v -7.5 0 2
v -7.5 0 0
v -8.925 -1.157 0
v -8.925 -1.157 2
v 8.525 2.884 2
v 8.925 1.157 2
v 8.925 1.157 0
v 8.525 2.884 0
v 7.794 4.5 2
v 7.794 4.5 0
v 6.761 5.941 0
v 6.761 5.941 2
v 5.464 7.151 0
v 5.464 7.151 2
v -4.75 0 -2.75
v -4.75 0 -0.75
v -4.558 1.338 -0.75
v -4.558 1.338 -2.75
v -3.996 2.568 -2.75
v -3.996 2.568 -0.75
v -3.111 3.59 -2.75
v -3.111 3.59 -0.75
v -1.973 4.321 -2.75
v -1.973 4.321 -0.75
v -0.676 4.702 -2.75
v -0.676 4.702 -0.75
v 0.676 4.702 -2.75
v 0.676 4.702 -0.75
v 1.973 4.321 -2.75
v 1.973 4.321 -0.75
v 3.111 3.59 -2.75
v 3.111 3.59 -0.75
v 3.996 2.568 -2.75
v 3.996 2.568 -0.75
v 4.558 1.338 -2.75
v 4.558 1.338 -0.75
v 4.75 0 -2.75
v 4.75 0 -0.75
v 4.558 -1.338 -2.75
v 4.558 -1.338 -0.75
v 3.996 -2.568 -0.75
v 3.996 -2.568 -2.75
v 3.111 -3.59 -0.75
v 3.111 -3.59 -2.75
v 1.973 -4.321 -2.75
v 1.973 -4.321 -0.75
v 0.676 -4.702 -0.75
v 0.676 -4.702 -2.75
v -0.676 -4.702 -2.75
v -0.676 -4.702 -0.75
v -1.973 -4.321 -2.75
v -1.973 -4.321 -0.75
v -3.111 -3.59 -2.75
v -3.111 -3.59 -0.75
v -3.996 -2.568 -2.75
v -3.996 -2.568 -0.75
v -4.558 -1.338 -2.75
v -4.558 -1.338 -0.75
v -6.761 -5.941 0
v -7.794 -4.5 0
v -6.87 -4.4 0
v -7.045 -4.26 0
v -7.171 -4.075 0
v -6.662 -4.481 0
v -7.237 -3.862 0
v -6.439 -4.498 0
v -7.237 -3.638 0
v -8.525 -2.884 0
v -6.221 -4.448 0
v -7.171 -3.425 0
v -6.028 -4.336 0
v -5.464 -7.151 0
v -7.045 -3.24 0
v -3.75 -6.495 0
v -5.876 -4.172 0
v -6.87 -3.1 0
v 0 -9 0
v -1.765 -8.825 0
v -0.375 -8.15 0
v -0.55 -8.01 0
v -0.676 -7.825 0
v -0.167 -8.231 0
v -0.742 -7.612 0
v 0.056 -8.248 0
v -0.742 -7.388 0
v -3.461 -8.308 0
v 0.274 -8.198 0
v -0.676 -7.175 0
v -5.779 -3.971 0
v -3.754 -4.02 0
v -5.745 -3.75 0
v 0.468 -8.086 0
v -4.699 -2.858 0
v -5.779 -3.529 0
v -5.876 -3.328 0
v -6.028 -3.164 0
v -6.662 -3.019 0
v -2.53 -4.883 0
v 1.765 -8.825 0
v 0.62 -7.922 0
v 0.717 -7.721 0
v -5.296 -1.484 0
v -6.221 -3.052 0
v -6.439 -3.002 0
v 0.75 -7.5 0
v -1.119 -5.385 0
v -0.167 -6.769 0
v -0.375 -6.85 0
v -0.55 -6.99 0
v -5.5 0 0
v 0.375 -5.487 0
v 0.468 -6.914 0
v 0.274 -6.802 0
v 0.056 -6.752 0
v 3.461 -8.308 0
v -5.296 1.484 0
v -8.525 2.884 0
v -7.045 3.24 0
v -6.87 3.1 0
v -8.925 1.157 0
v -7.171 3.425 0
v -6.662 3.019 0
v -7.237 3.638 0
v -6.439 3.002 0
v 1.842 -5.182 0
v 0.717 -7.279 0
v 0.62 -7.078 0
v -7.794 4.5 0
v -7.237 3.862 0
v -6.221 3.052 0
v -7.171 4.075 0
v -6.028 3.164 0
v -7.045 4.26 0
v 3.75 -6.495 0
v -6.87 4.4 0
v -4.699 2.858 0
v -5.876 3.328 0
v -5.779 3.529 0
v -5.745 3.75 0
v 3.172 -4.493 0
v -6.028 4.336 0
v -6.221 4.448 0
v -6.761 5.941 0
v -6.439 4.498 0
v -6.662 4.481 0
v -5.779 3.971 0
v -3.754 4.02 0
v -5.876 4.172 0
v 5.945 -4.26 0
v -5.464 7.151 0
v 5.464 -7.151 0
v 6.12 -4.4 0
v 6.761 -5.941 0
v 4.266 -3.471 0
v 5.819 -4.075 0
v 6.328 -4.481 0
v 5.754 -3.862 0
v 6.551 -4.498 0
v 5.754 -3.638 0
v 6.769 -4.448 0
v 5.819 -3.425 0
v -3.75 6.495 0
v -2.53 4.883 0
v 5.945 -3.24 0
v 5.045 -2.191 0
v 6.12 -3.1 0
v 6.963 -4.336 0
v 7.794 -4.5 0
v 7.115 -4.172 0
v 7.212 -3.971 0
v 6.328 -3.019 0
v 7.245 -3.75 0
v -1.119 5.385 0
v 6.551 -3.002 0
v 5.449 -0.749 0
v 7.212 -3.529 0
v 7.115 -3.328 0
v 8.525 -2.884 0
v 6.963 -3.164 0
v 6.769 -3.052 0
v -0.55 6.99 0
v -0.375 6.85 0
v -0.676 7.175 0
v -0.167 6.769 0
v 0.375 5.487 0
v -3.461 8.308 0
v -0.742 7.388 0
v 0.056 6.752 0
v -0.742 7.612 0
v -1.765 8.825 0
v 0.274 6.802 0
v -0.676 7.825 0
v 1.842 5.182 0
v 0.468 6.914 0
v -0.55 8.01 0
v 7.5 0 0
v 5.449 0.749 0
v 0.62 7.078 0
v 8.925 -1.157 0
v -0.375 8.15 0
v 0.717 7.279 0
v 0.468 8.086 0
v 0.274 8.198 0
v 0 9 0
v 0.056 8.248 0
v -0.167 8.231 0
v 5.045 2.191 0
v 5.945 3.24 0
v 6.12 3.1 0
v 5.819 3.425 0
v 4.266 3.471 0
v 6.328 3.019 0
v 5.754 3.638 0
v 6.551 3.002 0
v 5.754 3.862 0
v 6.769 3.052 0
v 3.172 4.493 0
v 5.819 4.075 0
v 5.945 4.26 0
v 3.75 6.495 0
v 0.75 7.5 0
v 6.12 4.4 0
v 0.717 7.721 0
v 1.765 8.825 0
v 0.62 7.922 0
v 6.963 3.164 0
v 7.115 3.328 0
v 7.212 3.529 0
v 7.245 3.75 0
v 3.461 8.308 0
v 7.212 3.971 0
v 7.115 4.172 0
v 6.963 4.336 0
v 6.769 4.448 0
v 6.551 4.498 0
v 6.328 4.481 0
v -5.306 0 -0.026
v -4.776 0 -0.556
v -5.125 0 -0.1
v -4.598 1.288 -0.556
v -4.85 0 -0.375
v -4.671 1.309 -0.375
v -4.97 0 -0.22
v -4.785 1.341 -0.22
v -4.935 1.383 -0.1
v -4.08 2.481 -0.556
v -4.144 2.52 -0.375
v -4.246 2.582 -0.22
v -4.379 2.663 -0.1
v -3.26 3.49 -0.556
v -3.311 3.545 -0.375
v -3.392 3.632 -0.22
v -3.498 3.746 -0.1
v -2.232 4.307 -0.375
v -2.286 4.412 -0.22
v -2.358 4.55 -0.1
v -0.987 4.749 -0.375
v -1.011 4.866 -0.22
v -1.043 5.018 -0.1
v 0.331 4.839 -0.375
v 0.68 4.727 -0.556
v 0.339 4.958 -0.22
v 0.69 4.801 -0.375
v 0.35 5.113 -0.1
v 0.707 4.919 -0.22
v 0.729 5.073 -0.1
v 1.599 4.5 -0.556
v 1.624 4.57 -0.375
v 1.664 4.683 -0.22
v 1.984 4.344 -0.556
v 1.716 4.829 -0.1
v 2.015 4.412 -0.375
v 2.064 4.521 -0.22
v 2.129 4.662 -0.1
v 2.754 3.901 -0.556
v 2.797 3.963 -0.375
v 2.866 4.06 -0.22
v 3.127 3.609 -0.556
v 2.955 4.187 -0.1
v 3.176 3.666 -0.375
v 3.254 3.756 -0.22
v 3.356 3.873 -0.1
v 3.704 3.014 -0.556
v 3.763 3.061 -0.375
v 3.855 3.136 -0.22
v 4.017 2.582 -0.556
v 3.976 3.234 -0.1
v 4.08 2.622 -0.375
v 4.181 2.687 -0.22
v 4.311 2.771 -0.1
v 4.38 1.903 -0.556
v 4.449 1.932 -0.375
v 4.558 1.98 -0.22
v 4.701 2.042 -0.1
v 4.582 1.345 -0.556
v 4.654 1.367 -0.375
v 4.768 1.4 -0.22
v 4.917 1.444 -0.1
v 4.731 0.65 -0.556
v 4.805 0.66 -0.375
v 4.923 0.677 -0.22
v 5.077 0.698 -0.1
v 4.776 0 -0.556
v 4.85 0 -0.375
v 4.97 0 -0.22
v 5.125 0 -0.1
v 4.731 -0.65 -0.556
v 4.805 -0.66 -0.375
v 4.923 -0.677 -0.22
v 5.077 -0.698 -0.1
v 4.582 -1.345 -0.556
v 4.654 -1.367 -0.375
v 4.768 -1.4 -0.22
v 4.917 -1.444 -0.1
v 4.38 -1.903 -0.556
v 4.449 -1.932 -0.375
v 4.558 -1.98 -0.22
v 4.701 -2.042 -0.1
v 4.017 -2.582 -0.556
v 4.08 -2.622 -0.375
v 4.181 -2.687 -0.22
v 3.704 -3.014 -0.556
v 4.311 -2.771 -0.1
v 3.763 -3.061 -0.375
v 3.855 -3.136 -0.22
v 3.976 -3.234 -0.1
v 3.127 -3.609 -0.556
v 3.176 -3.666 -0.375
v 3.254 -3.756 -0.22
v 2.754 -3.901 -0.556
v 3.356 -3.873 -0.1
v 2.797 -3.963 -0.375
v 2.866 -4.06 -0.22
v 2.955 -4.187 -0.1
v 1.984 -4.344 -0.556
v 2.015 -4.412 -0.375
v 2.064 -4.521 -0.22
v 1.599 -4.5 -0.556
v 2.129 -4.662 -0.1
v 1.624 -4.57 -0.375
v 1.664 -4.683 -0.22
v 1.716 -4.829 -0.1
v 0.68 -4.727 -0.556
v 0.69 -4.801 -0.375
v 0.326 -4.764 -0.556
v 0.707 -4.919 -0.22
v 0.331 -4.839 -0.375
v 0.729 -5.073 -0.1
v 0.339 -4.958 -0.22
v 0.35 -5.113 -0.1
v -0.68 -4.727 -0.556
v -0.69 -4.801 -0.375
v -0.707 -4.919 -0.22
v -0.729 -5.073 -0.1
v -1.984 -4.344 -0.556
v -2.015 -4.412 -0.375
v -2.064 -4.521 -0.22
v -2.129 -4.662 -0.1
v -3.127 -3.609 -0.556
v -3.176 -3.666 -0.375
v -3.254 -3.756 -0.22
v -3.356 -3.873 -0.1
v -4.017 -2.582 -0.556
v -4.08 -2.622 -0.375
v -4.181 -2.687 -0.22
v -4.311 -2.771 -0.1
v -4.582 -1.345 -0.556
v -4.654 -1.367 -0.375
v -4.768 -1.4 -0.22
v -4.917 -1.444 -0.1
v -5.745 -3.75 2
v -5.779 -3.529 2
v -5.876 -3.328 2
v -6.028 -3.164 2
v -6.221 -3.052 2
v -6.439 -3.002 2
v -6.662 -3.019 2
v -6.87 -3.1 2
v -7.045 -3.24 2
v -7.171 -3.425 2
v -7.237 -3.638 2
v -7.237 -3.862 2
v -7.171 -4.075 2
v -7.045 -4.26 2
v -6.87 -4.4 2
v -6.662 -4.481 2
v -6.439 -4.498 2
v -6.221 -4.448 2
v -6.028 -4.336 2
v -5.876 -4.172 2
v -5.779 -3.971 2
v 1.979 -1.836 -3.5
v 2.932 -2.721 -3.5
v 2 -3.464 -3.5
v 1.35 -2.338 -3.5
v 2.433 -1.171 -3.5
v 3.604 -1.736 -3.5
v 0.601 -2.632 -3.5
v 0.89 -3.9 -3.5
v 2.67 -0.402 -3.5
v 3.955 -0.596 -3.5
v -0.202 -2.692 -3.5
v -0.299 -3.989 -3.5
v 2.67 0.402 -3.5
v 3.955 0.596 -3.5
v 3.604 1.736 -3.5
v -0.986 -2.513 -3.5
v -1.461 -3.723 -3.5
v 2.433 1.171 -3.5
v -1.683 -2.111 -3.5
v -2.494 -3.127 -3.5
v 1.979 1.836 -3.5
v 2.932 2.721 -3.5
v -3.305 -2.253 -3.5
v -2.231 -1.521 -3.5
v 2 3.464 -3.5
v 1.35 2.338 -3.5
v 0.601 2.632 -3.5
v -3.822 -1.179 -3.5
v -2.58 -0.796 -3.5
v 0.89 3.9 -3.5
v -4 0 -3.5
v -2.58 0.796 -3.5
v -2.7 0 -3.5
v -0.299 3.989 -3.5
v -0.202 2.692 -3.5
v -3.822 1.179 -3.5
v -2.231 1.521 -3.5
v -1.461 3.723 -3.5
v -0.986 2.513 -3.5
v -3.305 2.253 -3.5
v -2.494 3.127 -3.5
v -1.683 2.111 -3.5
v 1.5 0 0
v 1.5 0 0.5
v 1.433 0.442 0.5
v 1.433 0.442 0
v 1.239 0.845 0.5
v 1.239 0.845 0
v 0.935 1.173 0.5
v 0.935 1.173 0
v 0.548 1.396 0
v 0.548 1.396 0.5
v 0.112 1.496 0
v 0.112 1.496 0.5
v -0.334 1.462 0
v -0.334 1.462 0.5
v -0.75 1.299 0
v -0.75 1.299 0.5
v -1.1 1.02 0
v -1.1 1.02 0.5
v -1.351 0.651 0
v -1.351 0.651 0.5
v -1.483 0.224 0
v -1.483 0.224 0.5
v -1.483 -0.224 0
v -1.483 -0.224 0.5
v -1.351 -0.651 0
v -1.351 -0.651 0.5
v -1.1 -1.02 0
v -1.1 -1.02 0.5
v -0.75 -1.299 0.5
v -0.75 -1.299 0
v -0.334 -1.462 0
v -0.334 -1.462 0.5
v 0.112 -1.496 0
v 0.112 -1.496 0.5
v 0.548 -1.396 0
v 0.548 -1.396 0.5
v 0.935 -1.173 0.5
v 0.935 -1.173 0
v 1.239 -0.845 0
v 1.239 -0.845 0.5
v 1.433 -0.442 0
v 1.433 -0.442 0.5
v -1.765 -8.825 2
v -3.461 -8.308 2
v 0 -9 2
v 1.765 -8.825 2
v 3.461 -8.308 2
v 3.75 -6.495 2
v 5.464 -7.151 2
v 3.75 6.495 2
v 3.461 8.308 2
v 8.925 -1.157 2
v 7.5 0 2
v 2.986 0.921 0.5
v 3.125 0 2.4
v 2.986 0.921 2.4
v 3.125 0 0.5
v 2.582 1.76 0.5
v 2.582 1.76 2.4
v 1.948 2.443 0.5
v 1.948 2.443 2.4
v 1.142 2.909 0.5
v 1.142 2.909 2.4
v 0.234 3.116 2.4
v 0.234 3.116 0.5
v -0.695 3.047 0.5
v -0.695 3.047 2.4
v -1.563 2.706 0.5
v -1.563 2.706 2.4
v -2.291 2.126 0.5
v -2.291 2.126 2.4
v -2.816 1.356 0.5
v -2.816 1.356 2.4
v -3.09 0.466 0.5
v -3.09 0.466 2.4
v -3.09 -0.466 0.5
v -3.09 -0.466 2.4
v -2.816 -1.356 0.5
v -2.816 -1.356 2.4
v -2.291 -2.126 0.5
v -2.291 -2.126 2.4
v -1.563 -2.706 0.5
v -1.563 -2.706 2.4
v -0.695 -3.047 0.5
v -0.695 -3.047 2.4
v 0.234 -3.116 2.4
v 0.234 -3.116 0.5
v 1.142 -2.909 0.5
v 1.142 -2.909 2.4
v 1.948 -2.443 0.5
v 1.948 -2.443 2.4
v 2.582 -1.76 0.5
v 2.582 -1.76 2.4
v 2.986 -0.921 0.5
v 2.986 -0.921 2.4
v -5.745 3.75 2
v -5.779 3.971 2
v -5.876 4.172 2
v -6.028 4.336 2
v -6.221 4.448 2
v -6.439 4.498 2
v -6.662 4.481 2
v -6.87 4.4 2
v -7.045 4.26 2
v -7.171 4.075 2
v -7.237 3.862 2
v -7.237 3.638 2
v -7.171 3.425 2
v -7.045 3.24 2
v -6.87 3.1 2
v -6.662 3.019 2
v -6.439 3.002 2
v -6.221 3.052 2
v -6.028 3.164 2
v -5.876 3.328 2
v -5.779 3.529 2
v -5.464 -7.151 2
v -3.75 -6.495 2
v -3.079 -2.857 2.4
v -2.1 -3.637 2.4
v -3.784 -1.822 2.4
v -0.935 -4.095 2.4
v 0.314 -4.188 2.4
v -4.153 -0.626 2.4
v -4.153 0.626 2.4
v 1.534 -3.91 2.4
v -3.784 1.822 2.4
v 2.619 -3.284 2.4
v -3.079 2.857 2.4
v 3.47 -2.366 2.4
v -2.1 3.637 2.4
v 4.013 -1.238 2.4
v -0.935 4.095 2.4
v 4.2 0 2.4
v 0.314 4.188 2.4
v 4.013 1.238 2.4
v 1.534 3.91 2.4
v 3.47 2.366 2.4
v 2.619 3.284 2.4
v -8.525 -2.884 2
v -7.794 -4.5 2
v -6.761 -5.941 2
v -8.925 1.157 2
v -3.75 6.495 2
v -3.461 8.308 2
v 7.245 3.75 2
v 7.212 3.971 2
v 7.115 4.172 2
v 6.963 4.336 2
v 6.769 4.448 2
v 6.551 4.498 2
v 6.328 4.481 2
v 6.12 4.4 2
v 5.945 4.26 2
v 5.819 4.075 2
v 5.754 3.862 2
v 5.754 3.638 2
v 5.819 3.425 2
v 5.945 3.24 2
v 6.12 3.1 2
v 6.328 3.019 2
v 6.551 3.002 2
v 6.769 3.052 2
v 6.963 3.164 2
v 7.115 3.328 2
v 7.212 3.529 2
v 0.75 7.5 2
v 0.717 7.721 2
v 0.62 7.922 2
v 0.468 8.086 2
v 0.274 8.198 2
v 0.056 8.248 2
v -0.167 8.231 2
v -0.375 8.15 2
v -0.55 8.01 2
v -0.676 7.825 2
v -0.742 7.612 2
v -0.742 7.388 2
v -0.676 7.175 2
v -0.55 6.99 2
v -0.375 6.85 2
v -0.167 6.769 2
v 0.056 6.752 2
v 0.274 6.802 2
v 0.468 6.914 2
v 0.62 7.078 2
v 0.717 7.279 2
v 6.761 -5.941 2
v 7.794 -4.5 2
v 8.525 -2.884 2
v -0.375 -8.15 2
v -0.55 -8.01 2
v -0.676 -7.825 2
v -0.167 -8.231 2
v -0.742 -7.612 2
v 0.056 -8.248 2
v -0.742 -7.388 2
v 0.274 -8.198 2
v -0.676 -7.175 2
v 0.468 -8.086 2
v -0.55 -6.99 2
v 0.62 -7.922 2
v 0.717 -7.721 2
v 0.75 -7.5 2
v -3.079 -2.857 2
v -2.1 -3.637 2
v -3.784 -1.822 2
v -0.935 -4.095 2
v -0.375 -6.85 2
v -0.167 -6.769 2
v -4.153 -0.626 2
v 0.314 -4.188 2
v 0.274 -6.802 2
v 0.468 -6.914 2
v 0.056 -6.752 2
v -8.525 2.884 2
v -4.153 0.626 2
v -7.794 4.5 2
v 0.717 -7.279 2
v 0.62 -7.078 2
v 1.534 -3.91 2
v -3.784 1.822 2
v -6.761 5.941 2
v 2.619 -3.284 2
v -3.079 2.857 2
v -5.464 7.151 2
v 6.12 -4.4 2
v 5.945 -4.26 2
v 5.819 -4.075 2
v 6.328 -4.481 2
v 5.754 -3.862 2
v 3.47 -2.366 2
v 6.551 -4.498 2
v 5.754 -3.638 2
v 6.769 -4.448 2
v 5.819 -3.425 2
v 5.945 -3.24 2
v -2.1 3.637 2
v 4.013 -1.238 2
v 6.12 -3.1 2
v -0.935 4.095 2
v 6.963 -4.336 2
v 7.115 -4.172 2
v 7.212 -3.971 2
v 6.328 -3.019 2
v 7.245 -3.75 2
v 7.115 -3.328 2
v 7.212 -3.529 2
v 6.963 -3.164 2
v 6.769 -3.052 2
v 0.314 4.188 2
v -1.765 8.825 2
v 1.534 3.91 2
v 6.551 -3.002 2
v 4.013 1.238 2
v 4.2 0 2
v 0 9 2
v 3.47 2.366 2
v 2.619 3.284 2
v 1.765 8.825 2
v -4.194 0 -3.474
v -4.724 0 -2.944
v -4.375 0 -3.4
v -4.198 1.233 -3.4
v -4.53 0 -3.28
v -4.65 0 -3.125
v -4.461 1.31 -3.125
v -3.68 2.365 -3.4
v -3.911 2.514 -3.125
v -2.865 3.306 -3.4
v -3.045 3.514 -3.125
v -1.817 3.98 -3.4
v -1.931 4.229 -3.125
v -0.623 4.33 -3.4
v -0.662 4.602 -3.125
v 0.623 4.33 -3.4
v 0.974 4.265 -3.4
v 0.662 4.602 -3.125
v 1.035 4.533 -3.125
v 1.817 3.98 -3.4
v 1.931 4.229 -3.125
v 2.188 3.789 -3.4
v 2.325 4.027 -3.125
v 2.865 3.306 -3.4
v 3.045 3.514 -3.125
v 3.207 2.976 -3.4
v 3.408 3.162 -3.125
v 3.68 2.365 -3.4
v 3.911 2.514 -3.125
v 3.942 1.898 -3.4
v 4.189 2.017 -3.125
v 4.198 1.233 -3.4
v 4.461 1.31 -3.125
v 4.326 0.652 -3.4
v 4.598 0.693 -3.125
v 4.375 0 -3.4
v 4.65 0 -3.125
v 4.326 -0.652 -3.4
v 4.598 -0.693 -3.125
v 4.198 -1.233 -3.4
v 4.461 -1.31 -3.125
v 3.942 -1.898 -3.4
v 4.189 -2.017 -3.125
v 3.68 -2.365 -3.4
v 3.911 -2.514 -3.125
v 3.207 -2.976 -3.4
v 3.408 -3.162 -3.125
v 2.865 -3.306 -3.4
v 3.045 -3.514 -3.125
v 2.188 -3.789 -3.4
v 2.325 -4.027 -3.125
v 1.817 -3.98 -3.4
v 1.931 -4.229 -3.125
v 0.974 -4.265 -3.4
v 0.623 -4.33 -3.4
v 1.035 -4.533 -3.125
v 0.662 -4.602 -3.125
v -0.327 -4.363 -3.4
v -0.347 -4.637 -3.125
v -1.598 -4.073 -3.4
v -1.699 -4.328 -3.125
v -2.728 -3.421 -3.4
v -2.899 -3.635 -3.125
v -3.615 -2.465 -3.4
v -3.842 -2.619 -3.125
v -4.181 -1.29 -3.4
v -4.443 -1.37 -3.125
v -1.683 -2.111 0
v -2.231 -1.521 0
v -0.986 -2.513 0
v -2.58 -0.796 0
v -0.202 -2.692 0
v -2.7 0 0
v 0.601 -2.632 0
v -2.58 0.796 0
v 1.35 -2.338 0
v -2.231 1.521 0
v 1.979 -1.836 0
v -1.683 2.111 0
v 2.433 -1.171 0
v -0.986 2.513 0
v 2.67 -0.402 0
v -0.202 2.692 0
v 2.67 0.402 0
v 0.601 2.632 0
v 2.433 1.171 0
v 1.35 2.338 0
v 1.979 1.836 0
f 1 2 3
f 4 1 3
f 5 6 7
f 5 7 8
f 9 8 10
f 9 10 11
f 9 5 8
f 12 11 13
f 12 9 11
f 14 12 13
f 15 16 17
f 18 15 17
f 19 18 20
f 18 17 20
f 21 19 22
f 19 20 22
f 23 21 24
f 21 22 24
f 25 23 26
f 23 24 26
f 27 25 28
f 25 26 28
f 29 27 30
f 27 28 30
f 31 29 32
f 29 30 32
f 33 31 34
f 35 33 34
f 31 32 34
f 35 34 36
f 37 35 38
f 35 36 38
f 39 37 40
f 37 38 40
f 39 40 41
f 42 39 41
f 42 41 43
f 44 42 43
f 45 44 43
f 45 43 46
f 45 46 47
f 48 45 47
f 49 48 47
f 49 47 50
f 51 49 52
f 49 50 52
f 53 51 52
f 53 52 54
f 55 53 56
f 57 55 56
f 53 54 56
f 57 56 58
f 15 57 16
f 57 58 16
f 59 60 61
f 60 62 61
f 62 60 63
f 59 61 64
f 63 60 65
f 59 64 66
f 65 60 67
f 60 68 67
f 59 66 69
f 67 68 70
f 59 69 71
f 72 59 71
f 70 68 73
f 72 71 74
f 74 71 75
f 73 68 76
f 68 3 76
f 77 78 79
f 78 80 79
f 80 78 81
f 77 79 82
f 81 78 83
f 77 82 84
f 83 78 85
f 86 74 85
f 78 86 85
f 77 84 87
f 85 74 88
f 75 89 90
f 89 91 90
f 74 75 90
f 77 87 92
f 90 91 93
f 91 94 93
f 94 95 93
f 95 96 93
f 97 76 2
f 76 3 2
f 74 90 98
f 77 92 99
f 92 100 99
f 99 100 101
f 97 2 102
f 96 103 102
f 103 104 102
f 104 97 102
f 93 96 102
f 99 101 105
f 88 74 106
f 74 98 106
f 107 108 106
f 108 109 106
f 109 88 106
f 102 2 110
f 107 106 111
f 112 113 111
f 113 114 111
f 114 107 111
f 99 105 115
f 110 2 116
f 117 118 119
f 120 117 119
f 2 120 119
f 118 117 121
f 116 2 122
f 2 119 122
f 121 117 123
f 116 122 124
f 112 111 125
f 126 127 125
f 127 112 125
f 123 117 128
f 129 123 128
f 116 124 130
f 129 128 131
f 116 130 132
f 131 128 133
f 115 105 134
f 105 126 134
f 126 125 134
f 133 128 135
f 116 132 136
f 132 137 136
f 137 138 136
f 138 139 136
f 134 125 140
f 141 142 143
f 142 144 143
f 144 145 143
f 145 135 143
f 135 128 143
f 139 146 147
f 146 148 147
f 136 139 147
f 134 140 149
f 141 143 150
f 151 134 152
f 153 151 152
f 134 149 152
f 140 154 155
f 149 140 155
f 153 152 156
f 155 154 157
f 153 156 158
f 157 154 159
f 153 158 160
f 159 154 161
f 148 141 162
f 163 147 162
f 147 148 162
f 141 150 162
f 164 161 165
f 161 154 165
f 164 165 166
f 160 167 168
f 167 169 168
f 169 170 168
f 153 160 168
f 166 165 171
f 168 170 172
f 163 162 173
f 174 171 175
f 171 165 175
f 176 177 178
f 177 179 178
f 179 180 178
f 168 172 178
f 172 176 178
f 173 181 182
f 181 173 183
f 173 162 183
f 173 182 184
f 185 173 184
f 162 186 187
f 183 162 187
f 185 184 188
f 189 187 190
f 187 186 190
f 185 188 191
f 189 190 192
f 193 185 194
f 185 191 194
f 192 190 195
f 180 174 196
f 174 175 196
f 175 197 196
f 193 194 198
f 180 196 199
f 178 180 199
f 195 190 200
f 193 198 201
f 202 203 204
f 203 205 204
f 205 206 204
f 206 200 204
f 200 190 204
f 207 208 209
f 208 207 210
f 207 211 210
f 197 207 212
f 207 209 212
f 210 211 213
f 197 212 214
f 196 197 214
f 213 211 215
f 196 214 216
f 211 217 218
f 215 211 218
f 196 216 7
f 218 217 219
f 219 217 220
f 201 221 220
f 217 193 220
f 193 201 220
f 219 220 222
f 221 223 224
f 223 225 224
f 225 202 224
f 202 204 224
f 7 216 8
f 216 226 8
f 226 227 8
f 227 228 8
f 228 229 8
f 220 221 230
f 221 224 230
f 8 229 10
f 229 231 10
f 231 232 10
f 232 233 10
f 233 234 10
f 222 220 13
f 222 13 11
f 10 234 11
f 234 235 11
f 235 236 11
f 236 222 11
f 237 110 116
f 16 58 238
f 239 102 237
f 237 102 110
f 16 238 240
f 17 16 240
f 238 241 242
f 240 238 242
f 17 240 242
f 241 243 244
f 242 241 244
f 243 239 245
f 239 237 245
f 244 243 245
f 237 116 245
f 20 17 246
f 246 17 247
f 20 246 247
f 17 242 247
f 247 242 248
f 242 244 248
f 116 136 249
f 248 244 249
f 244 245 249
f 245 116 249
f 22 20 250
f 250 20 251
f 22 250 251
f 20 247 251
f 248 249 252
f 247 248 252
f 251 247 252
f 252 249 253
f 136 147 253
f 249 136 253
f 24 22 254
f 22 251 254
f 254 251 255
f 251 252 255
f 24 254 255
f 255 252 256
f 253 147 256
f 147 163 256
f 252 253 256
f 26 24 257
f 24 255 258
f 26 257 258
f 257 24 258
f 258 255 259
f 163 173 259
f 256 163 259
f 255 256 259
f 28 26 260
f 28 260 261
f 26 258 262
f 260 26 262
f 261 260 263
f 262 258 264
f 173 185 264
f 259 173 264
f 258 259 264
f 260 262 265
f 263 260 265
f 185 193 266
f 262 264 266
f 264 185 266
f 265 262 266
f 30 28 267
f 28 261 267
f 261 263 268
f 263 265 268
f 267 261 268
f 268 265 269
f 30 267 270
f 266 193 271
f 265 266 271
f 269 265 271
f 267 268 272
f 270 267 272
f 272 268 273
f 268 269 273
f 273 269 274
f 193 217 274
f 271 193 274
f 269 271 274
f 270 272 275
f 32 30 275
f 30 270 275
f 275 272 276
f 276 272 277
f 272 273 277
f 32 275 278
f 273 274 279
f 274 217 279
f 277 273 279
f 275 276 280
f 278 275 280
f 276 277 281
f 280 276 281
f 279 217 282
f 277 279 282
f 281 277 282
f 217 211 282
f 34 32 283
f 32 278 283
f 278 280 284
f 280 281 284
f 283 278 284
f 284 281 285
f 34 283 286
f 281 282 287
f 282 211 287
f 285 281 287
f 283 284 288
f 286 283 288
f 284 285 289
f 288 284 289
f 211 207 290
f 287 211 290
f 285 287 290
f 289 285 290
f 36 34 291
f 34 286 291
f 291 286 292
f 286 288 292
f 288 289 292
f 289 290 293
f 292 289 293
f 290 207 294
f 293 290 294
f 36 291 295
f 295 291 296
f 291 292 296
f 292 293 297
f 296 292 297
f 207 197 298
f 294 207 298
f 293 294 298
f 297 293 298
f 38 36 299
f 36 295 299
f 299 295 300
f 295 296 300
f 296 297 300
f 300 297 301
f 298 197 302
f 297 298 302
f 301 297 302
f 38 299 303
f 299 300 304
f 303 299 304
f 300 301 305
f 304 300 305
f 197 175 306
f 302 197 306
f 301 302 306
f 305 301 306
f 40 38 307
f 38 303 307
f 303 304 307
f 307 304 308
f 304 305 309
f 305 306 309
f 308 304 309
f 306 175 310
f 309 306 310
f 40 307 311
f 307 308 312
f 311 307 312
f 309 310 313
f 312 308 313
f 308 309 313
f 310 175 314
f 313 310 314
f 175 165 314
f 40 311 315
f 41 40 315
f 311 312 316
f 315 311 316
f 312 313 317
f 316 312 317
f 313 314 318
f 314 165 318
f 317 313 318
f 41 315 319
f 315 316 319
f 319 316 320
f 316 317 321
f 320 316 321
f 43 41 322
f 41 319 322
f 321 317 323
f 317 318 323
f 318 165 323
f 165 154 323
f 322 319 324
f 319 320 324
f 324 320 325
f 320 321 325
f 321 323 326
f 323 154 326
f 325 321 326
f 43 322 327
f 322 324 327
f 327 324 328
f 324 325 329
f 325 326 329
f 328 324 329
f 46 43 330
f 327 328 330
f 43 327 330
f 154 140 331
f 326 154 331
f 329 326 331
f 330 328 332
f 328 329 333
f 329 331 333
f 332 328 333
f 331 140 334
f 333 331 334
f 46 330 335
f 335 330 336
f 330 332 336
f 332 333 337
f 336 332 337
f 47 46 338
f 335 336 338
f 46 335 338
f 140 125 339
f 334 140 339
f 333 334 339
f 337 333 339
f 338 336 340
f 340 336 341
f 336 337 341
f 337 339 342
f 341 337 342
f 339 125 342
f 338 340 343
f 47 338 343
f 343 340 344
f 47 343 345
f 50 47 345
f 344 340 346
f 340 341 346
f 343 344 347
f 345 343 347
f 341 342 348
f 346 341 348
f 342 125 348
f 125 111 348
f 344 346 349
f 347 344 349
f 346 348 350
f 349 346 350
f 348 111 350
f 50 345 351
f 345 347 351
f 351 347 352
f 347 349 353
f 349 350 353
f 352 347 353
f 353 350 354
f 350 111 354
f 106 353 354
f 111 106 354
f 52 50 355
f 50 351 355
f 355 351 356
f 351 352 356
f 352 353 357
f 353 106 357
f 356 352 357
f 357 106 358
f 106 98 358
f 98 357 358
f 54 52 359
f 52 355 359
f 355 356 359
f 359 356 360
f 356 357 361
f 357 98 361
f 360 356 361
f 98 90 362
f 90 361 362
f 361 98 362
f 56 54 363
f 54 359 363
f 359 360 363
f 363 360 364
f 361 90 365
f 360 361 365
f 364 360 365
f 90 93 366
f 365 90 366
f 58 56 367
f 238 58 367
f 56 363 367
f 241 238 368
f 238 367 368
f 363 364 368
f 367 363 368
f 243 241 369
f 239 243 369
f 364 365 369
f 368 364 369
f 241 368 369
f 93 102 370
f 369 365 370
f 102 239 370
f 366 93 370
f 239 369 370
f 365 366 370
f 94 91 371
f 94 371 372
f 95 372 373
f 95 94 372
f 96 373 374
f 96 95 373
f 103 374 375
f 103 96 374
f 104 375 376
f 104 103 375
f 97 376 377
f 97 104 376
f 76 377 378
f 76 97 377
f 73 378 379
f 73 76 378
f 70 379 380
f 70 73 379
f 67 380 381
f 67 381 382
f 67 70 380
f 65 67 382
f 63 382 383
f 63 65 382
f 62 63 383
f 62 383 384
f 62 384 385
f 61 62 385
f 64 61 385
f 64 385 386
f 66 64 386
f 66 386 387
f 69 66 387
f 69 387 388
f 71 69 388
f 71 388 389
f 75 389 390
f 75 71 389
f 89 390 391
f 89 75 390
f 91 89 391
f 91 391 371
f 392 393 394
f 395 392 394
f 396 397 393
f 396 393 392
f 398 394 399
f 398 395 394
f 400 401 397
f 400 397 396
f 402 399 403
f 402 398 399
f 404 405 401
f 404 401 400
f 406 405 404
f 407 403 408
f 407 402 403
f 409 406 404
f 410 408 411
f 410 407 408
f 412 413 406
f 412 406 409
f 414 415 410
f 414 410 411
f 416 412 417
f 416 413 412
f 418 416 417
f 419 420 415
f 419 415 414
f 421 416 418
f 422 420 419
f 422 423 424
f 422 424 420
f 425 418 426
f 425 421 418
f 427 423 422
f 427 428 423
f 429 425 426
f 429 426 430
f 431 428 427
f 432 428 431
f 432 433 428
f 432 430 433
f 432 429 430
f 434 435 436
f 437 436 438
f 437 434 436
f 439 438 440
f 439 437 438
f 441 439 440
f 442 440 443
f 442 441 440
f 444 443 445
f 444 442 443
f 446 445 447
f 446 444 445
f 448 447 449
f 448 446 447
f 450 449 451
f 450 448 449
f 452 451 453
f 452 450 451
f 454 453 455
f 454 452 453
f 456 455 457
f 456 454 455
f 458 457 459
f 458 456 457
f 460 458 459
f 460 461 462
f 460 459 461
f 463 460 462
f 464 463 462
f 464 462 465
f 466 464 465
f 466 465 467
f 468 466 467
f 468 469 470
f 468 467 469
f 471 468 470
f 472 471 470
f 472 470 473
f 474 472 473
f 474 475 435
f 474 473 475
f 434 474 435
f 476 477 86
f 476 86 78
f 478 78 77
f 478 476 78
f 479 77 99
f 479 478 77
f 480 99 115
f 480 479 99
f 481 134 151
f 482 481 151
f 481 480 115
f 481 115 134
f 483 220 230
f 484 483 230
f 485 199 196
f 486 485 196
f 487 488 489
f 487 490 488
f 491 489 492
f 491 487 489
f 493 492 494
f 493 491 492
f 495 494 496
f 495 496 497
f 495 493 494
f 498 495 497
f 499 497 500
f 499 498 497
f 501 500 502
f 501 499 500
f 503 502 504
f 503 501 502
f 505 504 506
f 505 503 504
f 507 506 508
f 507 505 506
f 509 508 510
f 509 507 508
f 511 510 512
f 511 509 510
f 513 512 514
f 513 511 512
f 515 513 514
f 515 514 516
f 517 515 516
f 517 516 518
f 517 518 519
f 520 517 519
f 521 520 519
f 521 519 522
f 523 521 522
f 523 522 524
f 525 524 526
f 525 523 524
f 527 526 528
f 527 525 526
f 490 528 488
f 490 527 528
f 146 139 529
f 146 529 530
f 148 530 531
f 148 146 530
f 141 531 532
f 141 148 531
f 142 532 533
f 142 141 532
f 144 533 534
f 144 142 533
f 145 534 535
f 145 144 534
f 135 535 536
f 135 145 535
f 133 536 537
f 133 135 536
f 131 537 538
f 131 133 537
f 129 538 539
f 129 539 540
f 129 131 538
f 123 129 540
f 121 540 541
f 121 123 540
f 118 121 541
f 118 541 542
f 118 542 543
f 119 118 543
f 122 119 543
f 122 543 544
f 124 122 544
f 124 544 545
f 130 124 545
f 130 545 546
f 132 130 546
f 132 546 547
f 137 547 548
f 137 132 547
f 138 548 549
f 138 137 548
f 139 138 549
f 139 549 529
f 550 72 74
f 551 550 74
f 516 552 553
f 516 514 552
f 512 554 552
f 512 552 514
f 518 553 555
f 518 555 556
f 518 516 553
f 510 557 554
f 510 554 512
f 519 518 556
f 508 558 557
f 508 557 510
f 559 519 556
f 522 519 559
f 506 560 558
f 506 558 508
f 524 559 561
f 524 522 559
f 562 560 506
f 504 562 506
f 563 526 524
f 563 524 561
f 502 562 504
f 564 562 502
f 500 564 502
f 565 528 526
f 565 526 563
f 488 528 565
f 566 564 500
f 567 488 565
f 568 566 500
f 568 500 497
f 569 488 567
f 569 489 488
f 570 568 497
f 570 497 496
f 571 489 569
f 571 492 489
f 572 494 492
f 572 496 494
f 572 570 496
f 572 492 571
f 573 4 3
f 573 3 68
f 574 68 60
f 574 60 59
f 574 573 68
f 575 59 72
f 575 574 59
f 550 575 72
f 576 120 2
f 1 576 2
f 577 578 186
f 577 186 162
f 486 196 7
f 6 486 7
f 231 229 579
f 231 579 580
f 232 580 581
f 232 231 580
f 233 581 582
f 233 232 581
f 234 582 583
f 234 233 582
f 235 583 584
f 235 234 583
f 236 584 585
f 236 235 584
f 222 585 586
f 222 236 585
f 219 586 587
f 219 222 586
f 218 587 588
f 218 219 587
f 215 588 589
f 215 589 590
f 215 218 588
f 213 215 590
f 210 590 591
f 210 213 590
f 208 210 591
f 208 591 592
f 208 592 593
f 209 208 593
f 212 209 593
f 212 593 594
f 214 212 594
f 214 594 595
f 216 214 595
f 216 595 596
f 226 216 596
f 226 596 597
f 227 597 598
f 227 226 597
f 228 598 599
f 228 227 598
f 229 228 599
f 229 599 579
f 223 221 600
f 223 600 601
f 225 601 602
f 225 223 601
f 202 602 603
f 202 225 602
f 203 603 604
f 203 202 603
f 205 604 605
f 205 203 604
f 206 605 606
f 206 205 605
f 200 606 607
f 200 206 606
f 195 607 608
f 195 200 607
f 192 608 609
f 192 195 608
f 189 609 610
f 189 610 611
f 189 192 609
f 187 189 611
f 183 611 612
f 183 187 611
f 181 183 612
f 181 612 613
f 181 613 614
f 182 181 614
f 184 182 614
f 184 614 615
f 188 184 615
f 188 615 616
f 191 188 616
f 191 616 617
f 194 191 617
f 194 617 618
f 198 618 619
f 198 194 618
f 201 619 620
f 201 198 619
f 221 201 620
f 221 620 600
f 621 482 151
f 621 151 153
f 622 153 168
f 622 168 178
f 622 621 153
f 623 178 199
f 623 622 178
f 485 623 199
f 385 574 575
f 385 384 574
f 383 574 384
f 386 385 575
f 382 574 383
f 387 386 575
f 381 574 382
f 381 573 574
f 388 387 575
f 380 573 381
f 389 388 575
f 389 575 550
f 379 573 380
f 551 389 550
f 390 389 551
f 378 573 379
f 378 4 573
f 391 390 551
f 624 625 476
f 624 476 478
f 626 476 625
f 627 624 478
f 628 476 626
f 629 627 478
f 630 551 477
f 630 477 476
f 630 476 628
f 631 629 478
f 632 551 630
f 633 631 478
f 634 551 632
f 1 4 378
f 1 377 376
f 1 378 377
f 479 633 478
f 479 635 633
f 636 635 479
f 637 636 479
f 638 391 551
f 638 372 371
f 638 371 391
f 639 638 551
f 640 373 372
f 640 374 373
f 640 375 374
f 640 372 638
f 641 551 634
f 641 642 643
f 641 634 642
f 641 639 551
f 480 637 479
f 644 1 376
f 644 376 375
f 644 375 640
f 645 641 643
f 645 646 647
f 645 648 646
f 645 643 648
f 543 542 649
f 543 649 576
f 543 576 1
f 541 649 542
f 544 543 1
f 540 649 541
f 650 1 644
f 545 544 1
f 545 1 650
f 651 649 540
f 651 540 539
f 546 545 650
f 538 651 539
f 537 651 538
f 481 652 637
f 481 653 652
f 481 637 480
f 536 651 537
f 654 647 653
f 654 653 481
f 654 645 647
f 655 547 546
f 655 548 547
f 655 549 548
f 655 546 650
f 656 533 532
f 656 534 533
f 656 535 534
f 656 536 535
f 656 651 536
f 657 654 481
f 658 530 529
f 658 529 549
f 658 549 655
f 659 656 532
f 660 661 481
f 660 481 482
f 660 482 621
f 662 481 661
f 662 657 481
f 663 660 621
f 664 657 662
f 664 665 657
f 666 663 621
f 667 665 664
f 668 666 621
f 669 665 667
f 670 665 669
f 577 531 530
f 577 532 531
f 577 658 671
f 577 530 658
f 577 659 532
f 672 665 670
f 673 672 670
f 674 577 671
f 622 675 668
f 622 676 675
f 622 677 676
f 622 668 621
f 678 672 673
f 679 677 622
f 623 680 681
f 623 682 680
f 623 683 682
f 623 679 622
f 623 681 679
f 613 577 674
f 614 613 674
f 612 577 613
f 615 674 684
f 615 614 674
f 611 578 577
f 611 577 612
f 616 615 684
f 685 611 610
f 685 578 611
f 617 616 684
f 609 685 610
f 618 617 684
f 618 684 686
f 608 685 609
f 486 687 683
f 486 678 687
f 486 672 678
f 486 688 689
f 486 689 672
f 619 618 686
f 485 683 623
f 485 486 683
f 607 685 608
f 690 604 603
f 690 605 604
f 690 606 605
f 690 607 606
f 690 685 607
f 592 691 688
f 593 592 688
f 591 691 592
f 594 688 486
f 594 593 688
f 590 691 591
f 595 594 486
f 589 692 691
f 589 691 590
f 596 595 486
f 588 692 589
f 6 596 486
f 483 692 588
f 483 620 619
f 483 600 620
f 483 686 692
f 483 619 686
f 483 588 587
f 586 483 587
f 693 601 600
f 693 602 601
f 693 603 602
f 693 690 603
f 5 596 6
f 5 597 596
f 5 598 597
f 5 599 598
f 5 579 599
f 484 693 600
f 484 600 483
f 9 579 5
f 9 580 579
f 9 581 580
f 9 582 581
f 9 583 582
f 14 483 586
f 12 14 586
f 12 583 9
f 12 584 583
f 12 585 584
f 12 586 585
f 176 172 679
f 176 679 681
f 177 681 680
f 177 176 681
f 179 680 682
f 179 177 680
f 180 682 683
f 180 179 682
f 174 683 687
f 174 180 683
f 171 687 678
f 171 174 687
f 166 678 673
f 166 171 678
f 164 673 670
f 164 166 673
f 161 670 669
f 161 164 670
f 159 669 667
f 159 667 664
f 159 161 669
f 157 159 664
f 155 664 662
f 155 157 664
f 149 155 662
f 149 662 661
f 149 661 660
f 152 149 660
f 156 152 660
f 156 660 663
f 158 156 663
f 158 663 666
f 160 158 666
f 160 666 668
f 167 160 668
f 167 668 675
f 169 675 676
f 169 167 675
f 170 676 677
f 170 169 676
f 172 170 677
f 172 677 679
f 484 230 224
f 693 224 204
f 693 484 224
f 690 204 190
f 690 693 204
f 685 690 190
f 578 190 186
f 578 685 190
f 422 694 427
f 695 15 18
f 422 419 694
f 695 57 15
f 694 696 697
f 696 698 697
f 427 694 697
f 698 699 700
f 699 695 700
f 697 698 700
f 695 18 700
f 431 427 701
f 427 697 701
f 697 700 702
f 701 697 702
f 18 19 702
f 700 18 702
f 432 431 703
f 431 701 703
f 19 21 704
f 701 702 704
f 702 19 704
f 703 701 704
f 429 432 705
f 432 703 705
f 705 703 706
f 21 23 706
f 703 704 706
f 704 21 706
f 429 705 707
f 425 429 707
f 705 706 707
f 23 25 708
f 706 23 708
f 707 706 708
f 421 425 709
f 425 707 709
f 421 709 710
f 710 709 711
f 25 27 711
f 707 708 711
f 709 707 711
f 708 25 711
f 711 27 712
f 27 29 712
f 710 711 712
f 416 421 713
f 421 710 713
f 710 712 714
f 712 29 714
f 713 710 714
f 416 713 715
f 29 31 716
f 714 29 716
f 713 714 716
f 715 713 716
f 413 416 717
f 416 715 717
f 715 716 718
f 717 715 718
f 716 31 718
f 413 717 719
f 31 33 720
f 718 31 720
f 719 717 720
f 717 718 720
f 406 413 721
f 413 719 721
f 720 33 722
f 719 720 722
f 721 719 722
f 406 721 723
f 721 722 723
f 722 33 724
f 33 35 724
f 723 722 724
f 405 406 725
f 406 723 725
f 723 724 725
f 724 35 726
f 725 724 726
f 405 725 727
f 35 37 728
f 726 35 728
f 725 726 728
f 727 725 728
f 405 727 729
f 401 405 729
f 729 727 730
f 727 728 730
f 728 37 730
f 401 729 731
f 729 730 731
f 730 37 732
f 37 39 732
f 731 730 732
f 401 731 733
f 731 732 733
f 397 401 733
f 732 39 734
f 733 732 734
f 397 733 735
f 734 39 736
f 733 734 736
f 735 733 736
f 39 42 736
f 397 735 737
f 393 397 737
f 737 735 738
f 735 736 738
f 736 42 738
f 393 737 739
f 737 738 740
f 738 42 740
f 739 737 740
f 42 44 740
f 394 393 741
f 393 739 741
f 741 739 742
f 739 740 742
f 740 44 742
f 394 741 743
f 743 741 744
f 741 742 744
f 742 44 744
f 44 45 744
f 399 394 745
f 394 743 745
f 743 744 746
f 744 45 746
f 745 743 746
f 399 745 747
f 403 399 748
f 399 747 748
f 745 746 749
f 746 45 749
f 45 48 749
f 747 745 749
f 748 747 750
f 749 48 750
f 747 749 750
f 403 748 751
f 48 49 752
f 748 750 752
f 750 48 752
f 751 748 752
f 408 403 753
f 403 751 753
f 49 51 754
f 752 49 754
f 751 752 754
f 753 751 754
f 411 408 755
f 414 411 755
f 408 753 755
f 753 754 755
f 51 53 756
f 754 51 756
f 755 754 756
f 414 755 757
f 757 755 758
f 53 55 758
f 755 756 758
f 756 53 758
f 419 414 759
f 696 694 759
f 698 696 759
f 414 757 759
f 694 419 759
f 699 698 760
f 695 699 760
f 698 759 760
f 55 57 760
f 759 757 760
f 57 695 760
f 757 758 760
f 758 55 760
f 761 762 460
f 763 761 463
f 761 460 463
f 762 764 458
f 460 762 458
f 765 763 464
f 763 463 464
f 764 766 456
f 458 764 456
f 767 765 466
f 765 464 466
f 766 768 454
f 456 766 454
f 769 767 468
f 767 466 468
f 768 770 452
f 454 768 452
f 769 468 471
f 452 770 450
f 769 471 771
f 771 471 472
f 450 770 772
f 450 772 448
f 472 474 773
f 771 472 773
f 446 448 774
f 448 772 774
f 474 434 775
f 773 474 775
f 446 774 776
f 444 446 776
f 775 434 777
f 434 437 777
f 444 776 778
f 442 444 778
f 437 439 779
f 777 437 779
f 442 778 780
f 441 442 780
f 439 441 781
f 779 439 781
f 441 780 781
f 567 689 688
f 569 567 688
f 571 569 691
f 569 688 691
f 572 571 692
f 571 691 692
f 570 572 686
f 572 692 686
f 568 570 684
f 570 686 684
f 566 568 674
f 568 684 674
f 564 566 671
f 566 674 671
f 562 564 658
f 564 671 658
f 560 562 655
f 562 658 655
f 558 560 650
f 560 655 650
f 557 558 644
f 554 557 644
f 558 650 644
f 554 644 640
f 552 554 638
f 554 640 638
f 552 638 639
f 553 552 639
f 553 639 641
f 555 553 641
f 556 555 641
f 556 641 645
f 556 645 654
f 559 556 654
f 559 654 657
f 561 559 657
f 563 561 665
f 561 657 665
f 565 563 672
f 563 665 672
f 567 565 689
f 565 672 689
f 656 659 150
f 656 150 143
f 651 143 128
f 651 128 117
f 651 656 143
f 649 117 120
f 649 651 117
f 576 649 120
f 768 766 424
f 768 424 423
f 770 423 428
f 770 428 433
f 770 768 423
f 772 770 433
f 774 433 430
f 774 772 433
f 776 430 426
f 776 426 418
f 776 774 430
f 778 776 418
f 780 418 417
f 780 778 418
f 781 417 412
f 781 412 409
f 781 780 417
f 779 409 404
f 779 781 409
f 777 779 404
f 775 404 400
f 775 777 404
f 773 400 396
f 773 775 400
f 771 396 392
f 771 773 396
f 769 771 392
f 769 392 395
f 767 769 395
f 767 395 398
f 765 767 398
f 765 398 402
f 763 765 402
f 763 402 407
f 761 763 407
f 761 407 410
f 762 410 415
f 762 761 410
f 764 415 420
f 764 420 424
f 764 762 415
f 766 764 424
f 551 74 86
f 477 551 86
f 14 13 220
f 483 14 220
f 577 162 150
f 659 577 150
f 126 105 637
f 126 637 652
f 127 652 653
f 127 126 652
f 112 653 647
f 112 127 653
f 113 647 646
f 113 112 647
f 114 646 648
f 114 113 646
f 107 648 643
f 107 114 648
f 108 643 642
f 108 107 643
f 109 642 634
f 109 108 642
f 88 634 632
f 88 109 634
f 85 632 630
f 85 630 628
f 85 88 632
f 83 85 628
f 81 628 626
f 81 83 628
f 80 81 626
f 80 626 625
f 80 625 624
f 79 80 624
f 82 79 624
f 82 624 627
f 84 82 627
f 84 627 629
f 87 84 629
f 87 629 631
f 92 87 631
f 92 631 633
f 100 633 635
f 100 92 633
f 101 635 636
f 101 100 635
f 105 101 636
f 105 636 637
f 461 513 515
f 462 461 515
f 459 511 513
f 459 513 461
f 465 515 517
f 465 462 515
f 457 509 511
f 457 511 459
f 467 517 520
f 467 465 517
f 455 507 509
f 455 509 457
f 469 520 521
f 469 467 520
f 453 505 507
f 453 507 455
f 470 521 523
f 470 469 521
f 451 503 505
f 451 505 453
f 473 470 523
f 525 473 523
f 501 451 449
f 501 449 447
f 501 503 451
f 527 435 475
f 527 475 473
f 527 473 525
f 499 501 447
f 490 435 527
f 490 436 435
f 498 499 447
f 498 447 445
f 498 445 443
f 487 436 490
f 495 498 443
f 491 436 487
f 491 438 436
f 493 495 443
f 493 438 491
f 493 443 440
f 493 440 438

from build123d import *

# Parameters (mm, degrees)
SKETCH1_R           = 1.5
SKETCH1_R_2         = 0.75
BOSS_EXTRUDE1_DEPTH = 2
SKETCH2_R           = 4.75
SKETCH2_R_2         = 2.7
BOSS_EXTRUDE2_DEPTH = 3.5
SKETCH3_R           = 4.2
SKETCH3_R_2         = 3.125
BOSS_EXTRUDE3_DEPTH = 0.4
SKETCH4_R           = 3.125
CUT_EXTRUDE1_DEPTH  = 1.5
FILLET1_R           = 0.75
SKETCH5_OUTSIDE_W   = 39.274
SKETCH5_OUTSIDE_H   = 42.892
SKETCH5_OUTSIDE_R   = 9
CUT_EXTRUDE2_DEPTH  = 6.5


with BuildPart() as part:
    # Sketch1 → Boss-Extrude1 (new body)
    with BuildSketch(Plane.XY):
        with BuildLine():
            Line((-2.567552709, 13.90947904), (-3.75, 6.495190528))
            Line((-3.75, 6.495190528), (-10.762185848, 9.178305392))
            ThreePointArc((-10.762185848, 9.178305392), (-13.943009001, 8.05), (-13.329738557, 4.731173648))
            Line((-13.329738557, 4.731173648), (-7.5, 0))
            Line((-7.5, 0), (-13.329738557, -4.731173648))
            ThreePointArc((-13.329738557, -4.731173648), (-13.943009001, -8.05), (-10.762185848, -9.178305392))
            Line((-10.762185848, -9.178305392), (-3.75, -6.495190528))
            Line((-3.75, -6.495190528), (-2.567552709, -13.90947904))
            ThreePointArc((-2.567552709, -13.90947904), (0, -16.1), (2.567552709, -13.90947904))
            Line((2.567552709, -13.90947904), (3.75, -6.495190528))
            Line((3.75, -6.495190528), (10.762185848, -9.178305392))
            ThreePointArc((10.762185848, -9.178305392), (13.943009001, -8.05), (13.329738557, -4.731173648))
            Line((13.329738557, -4.731173648), (7.5, 0))
            Line((7.5, 0), (13.329738557, 4.731173648))
            ThreePointArc((13.329738557, 4.731173648), (13.943009001, 8.05), (10.762185848, 9.178305392))
            Line((10.762185848, 9.178305392), (3.75, 6.495190528))
            Line((3.75, 6.495190528), (2.567552709, 13.90947904))
            ThreePointArc((2.567552709, 13.90947904), (0, 16.1), (-2.567552709, 13.90947904))
        make_face()
        Circle(SKETCH1_R, mode=Mode.SUBTRACT)
        with Locations((0, 13.5)):
            Circle(SKETCH1_R_2, mode=Mode.SUBTRACT)
        with Locations((0, 10.5)):
            Circle(SKETCH1_R_2, mode=Mode.SUBTRACT)
        with Locations((0, 7.5)):
            Circle(SKETCH1_R_2, mode=Mode.SUBTRACT)
        with Locations((6.495190528, 3.75)):
            Circle(SKETCH1_R_2, mode=Mode.SUBTRACT)
        with Locations((9.09326674, 5.25)):
            Circle(SKETCH1_R_2, mode=Mode.SUBTRACT)
        with Locations((11.691342951, 6.75)):
            Circle(SKETCH1_R_2, mode=Mode.SUBTRACT)
        with Locations((6.495190528, -3.75)):
            Circle(SKETCH1_R_2, mode=Mode.SUBTRACT)
        with Locations((9.09326674, -5.25)):
            Circle(SKETCH1_R_2, mode=Mode.SUBTRACT)
        with Locations((11.691342951, -6.75)):
            Circle(SKETCH1_R_2, mode=Mode.SUBTRACT)
        with Locations((0, -7.5)):
            Circle(SKETCH1_R_2, mode=Mode.SUBTRACT)
        with Locations((0, -10.5)):
            Circle(SKETCH1_R_2, mode=Mode.SUBTRACT)
        with Locations((0, -13.5)):
            Circle(SKETCH1_R_2, mode=Mode.SUBTRACT)
        with Locations((-6.495190528, -3.75)):
            Circle(SKETCH1_R_2, mode=Mode.SUBTRACT)
        with Locations((-9.09326674, -5.25)):
            Circle(SKETCH1_R_2, mode=Mode.SUBTRACT)
        with Locations((-11.691342951, -6.75)):
            Circle(SKETCH1_R_2, mode=Mode.SUBTRACT)
        with Locations((-6.495190528, 3.75)):
            Circle(SKETCH1_R_2, mode=Mode.SUBTRACT)
        with Locations((-9.09326674, 5.25)):
            Circle(SKETCH1_R_2, mode=Mode.SUBTRACT)
        with Locations((-11.691342951, 6.75)):
            Circle(SKETCH1_R_2, mode=Mode.SUBTRACT)
    extrude(amount=BOSS_EXTRUDE1_DEPTH)

    # Sketch2 → Boss-Extrude2 (add)
    with BuildSketch(Plane(origin=(0, 0, 0), x_dir=(-1, 0, 0), z_dir=(0, 0, -1))):
        Circle(SKETCH2_R)
        Circle(SKETCH2_R_2, mode=Mode.SUBTRACT)
    extrude(amount=BOSS_EXTRUDE2_DEPTH)

    # Sketch3 → Boss-Extrude3 (add)
    with BuildSketch(Plane.XY.offset(2)):
        Circle(SKETCH3_R)
        Circle(SKETCH3_R_2, mode=Mode.SUBTRACT)
    extrude(amount=BOSS_EXTRUDE3_DEPTH)

    # Sketch4 → Cut-Extrude1 (cut)
    with BuildSketch(Plane.XY.offset(2)):
        Circle(SKETCH4_R)
    extrude(amount=-CUT_EXTRUDE1_DEPTH, mode=Mode.SUBTRACT)

    # Fillet1
    fillet1_edges = [part.edges().sort_by_distance(p)[0] for p in [
        (4.75, 0, 0),
        (4.75, 0, -3.5),
    ]]
    fillet(fillet1_edges, radius=FILLET1_R)

    # Sketch5 outside → Cut-Extrude2 (cut, through all)
    with BuildSketch(Plane.XY.offset(2)):
        Rectangle(SKETCH5_OUTSIDE_W, SKETCH5_OUTSIDE_H)
        Circle(SKETCH5_OUTSIDE_R, mode=Mode.SUBTRACT)
    extrude(amount=-CUT_EXTRUDE2_DEPTH, mode=Mode.SUBTRACT)


solid = part.part
